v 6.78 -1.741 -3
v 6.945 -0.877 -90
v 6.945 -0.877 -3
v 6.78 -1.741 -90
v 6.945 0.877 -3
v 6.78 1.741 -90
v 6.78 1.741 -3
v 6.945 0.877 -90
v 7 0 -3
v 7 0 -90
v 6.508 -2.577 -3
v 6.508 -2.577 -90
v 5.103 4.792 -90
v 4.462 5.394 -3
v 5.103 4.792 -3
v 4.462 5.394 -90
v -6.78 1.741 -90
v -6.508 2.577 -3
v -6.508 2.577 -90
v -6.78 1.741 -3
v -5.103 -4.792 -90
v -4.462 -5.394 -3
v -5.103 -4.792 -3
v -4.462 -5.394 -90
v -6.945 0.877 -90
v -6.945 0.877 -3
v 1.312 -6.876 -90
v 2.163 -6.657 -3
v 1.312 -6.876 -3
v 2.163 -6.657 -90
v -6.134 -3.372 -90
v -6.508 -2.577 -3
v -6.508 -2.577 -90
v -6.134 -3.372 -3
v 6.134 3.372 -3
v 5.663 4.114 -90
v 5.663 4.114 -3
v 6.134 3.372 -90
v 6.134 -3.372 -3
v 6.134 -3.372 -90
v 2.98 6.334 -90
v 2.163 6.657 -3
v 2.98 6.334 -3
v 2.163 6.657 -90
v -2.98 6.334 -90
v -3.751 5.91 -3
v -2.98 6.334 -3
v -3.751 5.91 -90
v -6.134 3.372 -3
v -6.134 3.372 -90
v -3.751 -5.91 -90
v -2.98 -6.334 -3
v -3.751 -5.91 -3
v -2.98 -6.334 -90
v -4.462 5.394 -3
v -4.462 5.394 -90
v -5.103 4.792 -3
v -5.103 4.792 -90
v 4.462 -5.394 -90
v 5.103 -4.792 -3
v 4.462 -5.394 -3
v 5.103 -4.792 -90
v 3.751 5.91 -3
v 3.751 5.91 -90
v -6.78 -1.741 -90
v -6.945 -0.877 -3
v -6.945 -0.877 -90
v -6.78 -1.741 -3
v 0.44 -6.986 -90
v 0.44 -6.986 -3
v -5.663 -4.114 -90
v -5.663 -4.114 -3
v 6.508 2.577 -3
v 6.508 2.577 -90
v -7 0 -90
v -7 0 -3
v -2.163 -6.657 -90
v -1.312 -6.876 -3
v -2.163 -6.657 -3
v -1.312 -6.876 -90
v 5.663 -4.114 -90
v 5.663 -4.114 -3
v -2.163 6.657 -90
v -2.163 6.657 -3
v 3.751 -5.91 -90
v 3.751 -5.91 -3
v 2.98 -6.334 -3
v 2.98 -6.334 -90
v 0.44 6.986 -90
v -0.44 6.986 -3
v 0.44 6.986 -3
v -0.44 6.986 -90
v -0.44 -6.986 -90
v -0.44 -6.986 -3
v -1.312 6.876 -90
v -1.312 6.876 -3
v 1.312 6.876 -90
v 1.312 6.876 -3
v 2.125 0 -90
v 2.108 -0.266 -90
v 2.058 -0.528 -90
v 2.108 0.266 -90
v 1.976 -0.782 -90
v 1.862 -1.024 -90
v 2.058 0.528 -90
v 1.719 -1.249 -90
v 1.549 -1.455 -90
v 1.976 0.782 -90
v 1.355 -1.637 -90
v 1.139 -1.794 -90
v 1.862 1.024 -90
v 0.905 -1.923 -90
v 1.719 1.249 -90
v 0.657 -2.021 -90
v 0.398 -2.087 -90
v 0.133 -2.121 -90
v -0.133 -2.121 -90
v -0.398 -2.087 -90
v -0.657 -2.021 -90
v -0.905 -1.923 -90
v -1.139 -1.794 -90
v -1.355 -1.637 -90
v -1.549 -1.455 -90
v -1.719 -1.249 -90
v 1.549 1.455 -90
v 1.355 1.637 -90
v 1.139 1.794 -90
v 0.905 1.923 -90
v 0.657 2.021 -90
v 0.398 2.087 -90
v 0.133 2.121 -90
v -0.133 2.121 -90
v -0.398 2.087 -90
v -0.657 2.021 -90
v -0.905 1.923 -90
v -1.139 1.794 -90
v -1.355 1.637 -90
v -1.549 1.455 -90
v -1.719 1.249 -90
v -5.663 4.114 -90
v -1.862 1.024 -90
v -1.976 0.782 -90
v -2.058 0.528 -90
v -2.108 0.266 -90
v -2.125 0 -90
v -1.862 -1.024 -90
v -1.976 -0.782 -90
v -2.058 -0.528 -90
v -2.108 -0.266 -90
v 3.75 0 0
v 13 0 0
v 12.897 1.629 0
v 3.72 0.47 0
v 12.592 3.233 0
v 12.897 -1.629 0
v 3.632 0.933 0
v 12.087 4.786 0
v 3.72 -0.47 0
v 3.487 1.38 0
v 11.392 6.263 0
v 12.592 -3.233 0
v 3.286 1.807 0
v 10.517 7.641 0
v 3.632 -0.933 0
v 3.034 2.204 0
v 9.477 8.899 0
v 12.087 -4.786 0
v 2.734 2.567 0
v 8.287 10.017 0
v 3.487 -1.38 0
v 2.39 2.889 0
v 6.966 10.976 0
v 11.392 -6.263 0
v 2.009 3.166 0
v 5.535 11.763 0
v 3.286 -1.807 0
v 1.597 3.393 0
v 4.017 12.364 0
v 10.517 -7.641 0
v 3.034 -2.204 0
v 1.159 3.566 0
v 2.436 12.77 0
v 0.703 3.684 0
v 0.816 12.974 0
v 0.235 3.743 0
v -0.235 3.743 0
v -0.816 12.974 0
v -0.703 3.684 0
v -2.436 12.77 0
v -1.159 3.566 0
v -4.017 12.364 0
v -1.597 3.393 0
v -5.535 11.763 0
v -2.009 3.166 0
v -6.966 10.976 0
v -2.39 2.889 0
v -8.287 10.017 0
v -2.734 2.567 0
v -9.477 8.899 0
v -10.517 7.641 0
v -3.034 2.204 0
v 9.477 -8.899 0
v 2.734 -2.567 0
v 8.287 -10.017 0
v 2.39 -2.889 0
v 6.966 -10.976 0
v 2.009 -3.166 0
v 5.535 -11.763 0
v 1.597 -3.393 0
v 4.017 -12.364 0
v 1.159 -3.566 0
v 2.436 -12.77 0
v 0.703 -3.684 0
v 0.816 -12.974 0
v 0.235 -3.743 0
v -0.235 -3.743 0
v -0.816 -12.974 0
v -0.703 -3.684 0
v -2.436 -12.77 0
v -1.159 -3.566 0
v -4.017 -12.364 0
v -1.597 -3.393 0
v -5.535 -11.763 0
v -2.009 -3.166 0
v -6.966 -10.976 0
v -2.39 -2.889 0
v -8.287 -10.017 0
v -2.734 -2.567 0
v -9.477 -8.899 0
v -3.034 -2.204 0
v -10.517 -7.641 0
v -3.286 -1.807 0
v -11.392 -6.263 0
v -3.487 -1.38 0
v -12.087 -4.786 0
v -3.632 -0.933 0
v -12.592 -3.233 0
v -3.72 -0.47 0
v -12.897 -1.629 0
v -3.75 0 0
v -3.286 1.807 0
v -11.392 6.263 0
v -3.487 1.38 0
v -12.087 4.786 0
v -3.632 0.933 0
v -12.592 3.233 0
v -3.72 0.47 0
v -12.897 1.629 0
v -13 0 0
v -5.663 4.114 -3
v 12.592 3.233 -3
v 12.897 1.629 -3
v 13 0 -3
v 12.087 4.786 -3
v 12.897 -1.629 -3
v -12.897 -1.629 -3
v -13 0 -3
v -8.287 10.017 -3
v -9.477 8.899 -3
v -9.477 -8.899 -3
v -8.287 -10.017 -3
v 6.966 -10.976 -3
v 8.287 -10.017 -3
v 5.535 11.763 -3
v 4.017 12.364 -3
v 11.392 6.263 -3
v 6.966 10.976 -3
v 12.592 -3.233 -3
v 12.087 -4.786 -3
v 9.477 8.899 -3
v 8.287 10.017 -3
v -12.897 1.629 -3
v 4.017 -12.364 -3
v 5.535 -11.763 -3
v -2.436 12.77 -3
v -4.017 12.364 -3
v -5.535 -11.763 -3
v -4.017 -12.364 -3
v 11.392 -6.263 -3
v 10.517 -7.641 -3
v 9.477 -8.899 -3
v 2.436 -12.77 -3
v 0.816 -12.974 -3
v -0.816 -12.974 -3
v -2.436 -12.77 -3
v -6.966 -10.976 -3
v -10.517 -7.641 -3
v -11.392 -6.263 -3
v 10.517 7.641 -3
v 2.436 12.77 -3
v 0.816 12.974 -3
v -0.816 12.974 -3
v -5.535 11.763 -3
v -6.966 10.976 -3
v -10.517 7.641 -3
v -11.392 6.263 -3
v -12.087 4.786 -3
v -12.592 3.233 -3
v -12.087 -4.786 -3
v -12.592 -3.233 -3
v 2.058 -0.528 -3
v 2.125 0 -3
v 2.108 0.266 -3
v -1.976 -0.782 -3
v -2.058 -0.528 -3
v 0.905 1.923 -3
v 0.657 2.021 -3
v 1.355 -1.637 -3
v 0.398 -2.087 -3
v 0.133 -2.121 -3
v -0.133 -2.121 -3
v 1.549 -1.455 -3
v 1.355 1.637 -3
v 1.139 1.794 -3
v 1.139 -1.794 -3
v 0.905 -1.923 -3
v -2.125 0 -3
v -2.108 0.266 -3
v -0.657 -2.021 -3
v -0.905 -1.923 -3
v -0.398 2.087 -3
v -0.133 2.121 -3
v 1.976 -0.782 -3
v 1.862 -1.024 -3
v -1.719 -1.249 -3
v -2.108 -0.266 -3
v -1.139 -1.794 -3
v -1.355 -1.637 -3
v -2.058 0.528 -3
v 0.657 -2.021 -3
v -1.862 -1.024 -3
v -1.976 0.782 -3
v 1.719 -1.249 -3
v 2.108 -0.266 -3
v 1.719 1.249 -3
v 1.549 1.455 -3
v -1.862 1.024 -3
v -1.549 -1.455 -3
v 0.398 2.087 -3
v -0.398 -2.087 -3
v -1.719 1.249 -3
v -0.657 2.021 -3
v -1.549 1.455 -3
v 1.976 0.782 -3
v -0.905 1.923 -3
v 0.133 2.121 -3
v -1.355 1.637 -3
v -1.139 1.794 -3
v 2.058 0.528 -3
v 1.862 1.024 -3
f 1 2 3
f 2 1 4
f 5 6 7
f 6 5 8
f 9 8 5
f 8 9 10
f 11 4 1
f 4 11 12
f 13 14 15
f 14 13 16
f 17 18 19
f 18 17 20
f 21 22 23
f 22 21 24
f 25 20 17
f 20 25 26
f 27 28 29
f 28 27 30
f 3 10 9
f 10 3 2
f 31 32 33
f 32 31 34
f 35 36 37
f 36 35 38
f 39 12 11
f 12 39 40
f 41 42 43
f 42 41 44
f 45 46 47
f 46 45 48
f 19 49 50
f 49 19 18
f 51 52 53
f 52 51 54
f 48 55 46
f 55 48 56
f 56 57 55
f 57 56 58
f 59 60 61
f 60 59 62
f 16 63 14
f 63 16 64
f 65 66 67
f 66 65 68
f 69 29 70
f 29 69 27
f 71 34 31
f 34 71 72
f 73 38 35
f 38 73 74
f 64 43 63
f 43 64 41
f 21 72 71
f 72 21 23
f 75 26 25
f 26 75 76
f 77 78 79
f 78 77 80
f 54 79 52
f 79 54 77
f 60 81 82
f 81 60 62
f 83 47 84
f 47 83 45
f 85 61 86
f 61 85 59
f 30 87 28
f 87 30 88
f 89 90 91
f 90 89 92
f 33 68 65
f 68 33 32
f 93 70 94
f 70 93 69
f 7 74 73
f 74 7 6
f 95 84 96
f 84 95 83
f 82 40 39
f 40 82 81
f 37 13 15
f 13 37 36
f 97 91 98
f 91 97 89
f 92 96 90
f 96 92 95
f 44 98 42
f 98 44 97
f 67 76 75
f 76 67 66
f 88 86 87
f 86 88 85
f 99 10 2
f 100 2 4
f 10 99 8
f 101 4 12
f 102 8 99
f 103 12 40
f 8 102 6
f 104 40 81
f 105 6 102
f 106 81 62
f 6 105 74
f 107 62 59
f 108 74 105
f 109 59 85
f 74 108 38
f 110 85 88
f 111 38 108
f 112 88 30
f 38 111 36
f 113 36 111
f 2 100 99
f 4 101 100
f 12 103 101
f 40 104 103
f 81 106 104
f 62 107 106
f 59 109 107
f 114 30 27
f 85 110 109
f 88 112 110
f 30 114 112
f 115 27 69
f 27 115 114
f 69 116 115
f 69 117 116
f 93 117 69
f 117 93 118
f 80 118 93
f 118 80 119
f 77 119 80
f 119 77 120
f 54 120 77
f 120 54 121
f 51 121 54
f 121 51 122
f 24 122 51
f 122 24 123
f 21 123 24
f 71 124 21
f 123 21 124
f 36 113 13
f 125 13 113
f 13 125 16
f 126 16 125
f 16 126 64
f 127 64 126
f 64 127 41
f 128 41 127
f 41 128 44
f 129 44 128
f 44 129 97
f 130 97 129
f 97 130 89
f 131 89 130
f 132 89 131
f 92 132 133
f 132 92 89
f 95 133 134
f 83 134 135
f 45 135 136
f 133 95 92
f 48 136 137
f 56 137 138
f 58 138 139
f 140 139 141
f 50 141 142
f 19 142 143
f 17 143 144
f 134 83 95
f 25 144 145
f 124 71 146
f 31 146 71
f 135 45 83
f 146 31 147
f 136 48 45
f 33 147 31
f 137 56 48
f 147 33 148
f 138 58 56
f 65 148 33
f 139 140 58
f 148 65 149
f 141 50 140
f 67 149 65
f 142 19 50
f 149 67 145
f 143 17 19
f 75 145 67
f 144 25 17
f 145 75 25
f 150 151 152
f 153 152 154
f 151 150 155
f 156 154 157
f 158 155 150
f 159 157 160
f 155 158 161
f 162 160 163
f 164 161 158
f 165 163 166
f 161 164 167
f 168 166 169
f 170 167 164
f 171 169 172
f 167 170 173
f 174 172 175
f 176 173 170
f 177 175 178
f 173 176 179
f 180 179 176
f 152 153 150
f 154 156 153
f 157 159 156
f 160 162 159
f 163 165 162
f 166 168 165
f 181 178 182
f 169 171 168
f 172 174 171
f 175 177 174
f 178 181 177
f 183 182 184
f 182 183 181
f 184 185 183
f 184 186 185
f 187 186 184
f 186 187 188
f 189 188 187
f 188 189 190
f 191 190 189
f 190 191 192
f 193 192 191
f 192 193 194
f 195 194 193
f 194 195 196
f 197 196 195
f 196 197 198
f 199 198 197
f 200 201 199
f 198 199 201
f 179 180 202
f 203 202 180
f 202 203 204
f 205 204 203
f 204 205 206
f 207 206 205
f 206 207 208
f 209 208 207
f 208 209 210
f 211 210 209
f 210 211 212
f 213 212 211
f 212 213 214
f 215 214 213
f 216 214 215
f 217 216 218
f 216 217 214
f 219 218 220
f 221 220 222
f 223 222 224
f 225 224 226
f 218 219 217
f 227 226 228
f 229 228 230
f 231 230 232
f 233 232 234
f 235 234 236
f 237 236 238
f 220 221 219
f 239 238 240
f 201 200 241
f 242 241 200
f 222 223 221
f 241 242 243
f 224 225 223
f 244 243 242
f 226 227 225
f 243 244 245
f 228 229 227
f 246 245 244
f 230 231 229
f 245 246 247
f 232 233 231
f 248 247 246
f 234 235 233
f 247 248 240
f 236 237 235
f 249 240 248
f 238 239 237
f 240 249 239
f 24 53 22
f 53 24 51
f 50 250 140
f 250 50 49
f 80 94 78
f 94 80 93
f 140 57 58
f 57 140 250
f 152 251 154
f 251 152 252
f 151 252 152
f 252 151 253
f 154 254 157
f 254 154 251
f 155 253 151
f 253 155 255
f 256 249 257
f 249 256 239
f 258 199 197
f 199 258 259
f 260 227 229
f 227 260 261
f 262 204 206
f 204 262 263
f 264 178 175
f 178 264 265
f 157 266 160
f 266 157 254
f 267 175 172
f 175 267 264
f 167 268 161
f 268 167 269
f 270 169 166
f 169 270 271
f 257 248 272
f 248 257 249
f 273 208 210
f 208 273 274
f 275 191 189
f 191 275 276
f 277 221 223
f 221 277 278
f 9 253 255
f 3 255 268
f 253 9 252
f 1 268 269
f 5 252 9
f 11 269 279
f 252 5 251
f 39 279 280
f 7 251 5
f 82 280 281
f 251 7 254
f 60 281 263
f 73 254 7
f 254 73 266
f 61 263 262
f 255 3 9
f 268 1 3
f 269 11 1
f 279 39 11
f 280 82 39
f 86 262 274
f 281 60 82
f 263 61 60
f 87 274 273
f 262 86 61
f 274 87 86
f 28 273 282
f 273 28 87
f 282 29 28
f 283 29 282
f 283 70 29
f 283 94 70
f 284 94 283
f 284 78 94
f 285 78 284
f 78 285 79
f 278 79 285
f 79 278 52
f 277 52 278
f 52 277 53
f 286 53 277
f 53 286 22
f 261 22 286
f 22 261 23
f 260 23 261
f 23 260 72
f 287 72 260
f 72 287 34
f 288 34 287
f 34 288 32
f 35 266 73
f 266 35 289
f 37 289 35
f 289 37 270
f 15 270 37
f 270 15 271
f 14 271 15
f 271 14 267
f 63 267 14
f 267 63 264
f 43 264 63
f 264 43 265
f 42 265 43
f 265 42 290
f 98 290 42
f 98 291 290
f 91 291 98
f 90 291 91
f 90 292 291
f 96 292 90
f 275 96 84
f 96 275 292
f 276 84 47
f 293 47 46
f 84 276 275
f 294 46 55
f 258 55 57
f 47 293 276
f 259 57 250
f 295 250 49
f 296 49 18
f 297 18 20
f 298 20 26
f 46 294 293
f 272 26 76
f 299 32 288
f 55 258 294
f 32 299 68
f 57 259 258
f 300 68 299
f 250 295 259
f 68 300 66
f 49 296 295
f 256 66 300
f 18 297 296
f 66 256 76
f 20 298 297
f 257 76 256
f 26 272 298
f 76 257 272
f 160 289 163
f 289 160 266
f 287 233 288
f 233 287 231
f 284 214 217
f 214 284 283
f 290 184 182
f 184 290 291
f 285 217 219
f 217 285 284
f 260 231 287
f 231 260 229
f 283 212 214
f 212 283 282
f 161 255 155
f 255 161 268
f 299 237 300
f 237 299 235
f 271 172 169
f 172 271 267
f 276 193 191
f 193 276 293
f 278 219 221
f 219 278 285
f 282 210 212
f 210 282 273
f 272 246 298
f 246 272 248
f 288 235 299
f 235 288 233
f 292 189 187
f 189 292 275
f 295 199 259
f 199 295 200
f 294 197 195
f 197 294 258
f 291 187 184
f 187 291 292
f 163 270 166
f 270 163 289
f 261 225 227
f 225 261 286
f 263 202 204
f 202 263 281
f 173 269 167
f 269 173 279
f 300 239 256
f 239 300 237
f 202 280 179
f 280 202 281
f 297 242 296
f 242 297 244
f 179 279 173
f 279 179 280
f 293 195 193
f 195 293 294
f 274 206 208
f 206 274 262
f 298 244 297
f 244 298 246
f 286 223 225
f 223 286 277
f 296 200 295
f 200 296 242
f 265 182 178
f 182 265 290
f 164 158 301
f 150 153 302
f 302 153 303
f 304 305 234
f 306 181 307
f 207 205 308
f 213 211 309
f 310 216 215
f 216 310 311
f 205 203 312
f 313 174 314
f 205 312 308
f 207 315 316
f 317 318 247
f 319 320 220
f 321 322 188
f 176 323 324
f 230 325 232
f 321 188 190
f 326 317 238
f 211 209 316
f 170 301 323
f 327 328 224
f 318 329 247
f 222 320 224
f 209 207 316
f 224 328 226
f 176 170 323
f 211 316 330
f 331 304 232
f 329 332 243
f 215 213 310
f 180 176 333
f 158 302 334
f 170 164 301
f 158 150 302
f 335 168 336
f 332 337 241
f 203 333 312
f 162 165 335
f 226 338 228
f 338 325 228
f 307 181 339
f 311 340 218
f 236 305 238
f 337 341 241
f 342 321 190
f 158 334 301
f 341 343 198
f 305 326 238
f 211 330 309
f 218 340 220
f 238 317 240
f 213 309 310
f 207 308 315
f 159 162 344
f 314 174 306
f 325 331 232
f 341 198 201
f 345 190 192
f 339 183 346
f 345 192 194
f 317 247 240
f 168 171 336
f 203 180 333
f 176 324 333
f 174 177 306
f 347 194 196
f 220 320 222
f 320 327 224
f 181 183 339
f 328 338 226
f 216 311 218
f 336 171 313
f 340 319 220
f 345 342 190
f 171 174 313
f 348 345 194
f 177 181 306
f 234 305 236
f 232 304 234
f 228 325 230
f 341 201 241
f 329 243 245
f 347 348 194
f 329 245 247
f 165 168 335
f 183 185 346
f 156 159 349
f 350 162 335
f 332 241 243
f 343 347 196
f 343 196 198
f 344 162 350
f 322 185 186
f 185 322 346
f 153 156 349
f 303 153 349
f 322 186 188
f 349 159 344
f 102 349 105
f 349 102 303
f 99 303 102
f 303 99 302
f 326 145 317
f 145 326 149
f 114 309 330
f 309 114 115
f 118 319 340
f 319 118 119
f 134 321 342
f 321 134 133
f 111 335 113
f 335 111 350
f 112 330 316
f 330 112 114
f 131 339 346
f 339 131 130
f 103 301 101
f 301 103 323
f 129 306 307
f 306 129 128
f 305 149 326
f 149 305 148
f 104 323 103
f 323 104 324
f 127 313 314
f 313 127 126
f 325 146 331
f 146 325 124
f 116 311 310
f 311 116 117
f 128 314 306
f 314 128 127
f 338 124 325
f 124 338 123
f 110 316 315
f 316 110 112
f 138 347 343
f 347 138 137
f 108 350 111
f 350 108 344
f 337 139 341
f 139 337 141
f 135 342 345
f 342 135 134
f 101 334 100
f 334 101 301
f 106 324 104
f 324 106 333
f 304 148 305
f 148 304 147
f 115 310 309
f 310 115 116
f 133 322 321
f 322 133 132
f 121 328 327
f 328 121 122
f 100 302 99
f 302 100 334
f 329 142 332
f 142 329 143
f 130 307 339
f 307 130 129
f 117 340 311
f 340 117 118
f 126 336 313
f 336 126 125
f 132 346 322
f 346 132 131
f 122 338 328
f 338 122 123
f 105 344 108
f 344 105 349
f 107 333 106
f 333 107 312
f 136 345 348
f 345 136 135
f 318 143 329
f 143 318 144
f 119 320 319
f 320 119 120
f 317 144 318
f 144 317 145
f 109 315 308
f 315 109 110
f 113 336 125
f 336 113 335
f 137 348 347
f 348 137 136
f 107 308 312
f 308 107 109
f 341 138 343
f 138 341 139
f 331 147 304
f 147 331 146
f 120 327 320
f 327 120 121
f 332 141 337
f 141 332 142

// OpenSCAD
$fn = 50;


difference() {
	union() {
		translate(v = [0, 0, -90.0000000000]) {
			cylinder(h = 90, r = 7.0000000000);
		}
		translate(v = [0, 0, -3.0000000000]) {
			cylinder(h = 3, r = 13.0000000000);
		}
	}
	union() {
		translate(v = [0, 0, 0]) {
			rotate(a = [0, 0, 0]) {
				difference() {
					union() {
						#translate(v = [0, 0, -90.0000000000]) {
							cylinder(h = 90, r = 2.0000000000);
						}
						#translate(v = [0, 0, -3]) {
							cylinder(h = 3, r1 = 2.1250000000, r2 = 3.7500000000);
						}
						#translate(v = [0, 0, -90.0000000000]) {
							cylinder(h = 90, r = 2.1250000000);
						}
						#translate(v = [0, 0, -90.0000000000]) {
							cylinder(h = 90, r = 2.0000000000);
						}
					}
					union();
				}
			}
		}
	}
}
